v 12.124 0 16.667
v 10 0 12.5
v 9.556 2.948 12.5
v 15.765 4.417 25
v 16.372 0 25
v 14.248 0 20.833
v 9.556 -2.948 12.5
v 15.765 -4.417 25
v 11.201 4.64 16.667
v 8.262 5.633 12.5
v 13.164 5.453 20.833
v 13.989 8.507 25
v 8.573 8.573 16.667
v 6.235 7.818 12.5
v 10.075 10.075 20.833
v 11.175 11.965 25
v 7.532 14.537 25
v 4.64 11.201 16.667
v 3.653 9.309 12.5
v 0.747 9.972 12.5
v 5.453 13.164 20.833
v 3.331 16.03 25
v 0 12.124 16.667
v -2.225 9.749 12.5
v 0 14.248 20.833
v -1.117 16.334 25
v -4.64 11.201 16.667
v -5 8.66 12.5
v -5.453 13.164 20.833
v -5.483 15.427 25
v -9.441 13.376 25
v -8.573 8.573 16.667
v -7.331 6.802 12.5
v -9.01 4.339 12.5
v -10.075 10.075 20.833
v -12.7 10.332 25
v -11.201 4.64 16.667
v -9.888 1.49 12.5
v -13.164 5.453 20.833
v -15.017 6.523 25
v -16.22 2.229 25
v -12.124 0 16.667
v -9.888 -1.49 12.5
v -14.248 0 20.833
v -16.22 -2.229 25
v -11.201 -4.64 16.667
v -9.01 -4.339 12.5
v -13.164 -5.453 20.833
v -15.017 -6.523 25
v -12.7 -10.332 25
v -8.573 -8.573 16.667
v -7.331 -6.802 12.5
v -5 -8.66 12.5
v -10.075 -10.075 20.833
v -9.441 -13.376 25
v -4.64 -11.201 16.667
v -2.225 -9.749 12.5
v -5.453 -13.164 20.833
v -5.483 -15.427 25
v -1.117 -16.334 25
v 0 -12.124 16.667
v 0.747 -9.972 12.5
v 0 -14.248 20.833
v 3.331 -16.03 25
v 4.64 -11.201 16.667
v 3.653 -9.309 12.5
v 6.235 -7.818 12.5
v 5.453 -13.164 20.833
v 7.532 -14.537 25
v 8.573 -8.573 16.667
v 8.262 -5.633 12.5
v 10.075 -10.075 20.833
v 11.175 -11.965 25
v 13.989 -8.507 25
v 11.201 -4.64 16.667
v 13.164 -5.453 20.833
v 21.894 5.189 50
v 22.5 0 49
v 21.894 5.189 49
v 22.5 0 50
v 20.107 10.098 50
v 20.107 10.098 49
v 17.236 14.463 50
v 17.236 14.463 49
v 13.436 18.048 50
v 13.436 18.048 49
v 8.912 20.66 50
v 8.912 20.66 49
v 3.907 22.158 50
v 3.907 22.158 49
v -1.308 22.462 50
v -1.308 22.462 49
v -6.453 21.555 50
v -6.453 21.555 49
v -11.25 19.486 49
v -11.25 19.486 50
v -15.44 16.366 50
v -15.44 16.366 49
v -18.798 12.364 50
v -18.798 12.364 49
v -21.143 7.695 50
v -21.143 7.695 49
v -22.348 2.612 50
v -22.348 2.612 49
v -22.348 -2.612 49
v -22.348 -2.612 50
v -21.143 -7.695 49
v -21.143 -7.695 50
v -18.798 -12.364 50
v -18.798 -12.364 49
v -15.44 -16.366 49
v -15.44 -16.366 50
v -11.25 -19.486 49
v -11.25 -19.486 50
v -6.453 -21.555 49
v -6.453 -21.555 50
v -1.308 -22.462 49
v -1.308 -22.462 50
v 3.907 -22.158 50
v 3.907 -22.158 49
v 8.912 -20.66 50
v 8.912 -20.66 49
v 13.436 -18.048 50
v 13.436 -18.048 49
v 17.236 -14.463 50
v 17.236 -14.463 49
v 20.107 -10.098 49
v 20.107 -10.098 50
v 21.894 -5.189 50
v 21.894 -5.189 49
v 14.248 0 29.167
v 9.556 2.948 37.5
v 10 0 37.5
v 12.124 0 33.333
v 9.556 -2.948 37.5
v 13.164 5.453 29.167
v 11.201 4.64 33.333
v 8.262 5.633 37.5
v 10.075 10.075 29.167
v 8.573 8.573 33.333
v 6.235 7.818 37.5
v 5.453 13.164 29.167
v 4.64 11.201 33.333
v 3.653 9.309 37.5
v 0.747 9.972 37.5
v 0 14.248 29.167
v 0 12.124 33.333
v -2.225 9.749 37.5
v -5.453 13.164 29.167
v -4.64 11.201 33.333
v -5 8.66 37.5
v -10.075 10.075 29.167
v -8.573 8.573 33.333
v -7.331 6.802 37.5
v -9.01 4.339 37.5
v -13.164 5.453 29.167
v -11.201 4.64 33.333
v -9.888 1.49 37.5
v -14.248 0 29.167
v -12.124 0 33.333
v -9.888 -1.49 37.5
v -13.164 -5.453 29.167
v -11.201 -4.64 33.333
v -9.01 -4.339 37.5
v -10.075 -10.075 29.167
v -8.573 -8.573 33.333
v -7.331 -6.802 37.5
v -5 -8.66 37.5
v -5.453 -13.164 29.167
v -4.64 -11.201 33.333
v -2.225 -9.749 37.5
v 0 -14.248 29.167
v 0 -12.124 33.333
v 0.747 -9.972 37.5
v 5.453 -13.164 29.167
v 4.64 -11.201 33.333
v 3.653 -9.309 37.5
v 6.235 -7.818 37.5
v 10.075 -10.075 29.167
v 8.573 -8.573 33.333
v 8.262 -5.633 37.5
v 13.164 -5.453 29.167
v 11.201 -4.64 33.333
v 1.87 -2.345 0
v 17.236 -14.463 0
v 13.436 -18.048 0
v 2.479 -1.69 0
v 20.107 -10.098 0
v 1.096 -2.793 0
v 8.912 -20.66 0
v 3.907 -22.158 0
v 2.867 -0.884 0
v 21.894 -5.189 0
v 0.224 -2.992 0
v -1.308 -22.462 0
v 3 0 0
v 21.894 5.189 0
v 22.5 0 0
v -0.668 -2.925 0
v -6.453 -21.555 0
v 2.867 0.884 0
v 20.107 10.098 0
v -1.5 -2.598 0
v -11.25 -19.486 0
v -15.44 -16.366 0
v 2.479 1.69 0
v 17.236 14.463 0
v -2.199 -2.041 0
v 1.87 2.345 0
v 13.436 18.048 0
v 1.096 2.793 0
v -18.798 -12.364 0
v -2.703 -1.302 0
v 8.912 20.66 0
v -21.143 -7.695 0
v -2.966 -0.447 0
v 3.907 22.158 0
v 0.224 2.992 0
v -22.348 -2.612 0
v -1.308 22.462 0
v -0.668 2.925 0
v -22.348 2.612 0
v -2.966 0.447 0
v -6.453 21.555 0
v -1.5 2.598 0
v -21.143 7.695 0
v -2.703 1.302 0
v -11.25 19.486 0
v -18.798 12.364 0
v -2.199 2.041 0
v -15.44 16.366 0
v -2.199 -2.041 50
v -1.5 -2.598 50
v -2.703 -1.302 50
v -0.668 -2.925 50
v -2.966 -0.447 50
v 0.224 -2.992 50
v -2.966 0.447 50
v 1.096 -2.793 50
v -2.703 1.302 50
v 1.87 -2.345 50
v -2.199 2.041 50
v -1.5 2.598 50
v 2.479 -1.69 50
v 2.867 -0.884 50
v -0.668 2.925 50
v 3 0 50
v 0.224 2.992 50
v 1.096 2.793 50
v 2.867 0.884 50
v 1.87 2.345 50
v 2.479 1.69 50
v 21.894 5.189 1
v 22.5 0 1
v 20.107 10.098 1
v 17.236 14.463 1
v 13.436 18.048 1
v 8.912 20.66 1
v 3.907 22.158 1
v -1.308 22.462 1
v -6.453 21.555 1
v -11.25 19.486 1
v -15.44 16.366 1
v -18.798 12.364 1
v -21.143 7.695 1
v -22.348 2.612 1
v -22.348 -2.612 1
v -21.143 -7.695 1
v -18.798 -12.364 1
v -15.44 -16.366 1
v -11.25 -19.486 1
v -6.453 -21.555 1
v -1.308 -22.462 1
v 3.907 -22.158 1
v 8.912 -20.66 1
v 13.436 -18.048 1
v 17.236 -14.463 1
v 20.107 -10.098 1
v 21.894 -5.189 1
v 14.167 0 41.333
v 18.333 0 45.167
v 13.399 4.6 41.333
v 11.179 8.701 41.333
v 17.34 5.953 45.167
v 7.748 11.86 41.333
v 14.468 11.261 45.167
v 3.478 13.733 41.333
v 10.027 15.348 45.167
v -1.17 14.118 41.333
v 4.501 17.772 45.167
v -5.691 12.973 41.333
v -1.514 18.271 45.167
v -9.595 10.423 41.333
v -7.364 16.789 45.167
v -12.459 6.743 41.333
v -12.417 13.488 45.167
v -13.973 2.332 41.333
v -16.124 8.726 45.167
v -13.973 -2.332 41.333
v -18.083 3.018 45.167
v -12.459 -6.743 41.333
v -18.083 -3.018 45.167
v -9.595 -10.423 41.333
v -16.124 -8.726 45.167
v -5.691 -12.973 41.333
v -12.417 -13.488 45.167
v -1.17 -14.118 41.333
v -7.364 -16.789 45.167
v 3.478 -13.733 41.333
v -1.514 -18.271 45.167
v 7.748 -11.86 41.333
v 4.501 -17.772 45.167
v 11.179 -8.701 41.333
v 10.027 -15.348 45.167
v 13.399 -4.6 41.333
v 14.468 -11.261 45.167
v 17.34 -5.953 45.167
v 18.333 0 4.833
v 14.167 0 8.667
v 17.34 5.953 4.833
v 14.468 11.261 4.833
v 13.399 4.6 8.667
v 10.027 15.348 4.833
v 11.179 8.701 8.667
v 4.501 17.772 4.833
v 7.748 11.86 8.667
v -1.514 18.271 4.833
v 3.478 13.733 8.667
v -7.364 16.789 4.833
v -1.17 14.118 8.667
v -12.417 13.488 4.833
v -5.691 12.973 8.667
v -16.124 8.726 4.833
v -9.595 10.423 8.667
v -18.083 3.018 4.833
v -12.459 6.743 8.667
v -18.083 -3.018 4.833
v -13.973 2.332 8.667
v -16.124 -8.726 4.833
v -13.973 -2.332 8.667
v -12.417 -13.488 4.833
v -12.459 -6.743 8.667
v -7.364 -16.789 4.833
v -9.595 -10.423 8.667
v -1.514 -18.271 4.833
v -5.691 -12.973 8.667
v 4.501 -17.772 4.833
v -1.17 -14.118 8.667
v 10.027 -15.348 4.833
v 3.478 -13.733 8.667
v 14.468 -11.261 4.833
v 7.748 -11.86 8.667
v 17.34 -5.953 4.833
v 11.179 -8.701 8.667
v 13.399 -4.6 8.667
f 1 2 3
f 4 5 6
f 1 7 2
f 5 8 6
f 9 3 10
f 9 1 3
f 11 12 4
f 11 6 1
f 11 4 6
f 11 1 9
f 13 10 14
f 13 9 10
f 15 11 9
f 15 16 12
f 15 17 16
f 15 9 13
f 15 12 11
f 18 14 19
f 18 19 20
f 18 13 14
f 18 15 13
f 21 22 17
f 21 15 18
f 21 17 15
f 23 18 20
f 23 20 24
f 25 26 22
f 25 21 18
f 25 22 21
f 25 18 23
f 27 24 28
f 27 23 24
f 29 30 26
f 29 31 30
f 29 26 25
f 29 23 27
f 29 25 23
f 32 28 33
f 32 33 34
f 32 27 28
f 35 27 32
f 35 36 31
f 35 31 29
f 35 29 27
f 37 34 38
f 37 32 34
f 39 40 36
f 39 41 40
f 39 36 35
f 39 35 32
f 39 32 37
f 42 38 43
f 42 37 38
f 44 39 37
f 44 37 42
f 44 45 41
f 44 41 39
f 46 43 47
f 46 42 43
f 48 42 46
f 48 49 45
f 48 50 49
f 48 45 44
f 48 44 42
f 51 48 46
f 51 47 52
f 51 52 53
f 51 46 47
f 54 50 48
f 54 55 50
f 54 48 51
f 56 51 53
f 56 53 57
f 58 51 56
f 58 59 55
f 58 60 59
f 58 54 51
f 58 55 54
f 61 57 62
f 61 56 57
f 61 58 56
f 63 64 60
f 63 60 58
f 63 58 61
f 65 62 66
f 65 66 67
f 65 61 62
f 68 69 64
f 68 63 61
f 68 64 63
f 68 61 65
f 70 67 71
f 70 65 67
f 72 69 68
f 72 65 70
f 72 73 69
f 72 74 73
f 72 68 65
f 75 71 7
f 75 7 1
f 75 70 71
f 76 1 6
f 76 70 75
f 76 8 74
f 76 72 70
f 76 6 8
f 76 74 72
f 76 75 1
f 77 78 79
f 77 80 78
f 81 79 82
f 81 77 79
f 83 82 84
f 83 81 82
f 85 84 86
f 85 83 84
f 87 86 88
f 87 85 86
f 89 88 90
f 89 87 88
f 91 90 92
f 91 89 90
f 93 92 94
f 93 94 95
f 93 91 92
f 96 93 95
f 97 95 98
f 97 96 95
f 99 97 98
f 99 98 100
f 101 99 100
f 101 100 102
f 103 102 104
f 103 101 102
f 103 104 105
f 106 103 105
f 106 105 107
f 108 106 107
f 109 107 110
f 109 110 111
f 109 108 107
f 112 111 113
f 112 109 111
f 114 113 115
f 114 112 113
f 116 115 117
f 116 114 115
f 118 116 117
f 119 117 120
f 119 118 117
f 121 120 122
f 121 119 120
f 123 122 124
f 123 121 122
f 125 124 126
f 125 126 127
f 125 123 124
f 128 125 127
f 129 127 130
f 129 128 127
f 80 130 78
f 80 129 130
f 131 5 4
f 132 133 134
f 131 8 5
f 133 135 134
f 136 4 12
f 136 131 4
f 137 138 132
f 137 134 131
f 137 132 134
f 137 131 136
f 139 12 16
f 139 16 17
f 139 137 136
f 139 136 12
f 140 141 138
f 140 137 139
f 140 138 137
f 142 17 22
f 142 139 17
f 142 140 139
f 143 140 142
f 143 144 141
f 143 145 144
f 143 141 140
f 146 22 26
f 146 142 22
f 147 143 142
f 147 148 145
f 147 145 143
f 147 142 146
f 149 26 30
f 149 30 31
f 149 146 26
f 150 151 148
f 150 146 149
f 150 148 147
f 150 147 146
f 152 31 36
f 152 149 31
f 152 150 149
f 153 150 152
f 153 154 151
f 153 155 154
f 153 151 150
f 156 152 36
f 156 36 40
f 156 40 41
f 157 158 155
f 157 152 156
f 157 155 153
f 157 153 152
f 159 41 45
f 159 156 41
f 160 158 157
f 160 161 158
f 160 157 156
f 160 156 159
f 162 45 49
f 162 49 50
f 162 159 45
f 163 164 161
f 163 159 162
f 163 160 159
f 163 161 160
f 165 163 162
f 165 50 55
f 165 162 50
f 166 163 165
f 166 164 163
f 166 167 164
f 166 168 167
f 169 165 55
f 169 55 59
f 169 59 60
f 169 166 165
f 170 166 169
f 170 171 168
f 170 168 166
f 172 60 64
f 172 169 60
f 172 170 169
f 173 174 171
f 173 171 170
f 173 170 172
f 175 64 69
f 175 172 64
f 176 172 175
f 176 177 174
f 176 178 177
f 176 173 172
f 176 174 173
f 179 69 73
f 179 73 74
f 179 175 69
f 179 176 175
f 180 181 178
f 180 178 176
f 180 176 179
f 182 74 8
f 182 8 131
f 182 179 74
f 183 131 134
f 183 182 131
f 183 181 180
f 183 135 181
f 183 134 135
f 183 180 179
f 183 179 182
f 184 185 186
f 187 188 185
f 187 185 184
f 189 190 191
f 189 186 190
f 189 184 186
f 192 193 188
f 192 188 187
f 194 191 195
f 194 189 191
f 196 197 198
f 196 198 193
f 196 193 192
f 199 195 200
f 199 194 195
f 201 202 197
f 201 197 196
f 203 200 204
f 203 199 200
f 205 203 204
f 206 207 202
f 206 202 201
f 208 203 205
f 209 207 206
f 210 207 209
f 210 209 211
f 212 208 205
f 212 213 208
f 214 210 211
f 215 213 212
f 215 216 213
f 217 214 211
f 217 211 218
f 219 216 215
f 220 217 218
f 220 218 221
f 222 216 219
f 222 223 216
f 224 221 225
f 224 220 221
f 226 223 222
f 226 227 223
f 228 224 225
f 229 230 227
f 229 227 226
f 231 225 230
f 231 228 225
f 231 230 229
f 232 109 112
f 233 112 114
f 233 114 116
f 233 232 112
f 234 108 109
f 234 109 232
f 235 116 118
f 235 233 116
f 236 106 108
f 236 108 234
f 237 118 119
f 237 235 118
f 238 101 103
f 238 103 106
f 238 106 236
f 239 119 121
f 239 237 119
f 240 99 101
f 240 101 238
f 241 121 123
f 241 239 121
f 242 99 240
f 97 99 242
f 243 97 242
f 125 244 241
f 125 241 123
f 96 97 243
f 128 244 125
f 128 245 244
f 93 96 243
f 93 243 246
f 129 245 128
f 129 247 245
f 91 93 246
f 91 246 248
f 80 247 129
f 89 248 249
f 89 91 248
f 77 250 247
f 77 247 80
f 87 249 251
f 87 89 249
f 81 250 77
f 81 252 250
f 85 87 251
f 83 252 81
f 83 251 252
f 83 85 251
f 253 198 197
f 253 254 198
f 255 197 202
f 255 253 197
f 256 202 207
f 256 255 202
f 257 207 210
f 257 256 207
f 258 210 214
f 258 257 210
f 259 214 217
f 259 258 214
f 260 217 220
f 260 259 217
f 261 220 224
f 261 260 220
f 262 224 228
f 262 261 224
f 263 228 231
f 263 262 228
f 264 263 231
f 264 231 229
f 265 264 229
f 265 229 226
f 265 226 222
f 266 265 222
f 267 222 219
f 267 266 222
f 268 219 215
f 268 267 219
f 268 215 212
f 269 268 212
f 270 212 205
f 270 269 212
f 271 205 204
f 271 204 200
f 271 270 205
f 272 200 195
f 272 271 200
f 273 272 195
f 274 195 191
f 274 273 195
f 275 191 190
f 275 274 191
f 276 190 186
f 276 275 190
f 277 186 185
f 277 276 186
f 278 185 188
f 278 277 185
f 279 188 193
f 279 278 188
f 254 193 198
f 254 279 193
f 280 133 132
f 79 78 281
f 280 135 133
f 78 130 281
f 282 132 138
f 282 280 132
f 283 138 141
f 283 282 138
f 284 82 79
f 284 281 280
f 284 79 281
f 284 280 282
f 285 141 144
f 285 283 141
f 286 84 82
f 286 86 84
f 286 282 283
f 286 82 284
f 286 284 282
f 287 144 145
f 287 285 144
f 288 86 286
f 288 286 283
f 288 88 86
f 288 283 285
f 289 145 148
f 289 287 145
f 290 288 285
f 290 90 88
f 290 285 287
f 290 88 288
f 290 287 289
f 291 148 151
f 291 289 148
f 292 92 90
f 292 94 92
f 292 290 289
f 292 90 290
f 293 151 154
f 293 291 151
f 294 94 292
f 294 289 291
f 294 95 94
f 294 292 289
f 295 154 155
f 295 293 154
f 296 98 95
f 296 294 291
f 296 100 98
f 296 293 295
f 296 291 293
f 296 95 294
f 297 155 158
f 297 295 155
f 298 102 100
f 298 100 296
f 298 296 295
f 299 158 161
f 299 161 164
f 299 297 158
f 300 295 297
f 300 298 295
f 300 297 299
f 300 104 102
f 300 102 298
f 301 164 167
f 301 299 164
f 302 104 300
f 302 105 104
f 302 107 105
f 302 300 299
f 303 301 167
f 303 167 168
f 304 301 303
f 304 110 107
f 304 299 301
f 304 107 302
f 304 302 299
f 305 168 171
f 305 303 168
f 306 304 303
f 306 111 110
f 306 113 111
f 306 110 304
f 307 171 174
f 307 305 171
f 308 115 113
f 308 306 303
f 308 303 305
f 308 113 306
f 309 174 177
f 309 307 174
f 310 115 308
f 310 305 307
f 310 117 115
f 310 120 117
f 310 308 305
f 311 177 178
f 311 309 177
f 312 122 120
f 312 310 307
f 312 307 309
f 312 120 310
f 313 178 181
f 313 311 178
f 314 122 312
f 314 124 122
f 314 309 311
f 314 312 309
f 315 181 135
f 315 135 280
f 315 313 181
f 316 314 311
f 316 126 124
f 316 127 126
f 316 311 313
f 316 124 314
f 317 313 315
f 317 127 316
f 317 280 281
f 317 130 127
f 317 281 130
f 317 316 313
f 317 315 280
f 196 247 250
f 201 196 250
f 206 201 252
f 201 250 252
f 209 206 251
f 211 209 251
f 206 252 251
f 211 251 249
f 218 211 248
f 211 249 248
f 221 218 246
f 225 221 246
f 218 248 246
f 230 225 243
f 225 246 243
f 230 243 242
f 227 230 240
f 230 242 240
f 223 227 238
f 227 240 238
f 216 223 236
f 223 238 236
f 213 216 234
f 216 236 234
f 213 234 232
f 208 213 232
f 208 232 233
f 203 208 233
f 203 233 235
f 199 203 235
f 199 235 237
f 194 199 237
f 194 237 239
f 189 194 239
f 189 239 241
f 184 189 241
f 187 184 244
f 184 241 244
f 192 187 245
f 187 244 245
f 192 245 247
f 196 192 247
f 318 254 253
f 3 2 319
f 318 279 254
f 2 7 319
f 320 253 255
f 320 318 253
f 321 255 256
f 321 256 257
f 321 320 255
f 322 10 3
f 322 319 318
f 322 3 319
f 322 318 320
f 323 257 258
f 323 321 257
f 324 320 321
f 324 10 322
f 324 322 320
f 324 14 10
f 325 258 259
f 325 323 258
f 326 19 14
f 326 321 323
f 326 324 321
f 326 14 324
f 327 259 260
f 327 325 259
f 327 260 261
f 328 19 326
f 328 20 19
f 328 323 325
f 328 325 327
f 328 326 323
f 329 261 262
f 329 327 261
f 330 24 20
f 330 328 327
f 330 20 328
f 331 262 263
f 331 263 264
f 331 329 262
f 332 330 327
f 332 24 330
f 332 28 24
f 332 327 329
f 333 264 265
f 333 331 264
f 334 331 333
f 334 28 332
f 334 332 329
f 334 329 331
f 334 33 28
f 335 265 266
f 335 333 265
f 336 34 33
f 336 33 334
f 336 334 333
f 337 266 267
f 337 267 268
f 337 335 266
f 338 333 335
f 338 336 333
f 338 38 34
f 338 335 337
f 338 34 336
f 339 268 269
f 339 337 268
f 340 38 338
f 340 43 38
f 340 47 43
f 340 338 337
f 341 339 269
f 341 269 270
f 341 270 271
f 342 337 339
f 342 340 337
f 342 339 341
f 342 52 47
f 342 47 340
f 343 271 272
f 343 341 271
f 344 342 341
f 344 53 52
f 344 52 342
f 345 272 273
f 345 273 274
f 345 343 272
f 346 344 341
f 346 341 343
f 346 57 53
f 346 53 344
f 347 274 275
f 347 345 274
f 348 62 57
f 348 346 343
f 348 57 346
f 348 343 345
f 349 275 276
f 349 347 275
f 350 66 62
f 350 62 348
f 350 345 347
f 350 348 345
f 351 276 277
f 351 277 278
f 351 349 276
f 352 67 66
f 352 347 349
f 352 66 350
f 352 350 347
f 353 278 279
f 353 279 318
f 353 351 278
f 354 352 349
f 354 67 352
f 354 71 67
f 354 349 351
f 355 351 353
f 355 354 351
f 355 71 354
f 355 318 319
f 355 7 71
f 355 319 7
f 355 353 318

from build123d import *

# Parameters (mm, degrees)
F2_R     = 3
F3_DEPTH = 50


with BuildPart() as f1:
    # F0 (on Front) → F1 (revolve)
    with BuildSketch(Plane.XZ):
        Polygon((0, 12.5), (0, 0), (22.5, 0), (22.5, 1), (10, 12.5), align=None)
        Polygon((0, 25), (0, 12.5), (10, 12.5), (16.372113, 25), align=None)
        Polygon((0, 37.5), (0, 25), (16.372113, 25), (10, 37.5), align=None)
        Polygon((0, 50), (0, 37.5), (10, 37.5), (22.5, 49), (22.5, 50), align=None)
    revolve(axis=Axis((0, 0, 25), (0, 0, 1)))

    # F2 (on face) → F3 (cut)
    with BuildSketch(Plane.XY.offset(50)):
        Circle(F2_R)
    extrude(amount=-F3_DEPTH, mode=Mode.SUBTRACT)


solid = f1.part
